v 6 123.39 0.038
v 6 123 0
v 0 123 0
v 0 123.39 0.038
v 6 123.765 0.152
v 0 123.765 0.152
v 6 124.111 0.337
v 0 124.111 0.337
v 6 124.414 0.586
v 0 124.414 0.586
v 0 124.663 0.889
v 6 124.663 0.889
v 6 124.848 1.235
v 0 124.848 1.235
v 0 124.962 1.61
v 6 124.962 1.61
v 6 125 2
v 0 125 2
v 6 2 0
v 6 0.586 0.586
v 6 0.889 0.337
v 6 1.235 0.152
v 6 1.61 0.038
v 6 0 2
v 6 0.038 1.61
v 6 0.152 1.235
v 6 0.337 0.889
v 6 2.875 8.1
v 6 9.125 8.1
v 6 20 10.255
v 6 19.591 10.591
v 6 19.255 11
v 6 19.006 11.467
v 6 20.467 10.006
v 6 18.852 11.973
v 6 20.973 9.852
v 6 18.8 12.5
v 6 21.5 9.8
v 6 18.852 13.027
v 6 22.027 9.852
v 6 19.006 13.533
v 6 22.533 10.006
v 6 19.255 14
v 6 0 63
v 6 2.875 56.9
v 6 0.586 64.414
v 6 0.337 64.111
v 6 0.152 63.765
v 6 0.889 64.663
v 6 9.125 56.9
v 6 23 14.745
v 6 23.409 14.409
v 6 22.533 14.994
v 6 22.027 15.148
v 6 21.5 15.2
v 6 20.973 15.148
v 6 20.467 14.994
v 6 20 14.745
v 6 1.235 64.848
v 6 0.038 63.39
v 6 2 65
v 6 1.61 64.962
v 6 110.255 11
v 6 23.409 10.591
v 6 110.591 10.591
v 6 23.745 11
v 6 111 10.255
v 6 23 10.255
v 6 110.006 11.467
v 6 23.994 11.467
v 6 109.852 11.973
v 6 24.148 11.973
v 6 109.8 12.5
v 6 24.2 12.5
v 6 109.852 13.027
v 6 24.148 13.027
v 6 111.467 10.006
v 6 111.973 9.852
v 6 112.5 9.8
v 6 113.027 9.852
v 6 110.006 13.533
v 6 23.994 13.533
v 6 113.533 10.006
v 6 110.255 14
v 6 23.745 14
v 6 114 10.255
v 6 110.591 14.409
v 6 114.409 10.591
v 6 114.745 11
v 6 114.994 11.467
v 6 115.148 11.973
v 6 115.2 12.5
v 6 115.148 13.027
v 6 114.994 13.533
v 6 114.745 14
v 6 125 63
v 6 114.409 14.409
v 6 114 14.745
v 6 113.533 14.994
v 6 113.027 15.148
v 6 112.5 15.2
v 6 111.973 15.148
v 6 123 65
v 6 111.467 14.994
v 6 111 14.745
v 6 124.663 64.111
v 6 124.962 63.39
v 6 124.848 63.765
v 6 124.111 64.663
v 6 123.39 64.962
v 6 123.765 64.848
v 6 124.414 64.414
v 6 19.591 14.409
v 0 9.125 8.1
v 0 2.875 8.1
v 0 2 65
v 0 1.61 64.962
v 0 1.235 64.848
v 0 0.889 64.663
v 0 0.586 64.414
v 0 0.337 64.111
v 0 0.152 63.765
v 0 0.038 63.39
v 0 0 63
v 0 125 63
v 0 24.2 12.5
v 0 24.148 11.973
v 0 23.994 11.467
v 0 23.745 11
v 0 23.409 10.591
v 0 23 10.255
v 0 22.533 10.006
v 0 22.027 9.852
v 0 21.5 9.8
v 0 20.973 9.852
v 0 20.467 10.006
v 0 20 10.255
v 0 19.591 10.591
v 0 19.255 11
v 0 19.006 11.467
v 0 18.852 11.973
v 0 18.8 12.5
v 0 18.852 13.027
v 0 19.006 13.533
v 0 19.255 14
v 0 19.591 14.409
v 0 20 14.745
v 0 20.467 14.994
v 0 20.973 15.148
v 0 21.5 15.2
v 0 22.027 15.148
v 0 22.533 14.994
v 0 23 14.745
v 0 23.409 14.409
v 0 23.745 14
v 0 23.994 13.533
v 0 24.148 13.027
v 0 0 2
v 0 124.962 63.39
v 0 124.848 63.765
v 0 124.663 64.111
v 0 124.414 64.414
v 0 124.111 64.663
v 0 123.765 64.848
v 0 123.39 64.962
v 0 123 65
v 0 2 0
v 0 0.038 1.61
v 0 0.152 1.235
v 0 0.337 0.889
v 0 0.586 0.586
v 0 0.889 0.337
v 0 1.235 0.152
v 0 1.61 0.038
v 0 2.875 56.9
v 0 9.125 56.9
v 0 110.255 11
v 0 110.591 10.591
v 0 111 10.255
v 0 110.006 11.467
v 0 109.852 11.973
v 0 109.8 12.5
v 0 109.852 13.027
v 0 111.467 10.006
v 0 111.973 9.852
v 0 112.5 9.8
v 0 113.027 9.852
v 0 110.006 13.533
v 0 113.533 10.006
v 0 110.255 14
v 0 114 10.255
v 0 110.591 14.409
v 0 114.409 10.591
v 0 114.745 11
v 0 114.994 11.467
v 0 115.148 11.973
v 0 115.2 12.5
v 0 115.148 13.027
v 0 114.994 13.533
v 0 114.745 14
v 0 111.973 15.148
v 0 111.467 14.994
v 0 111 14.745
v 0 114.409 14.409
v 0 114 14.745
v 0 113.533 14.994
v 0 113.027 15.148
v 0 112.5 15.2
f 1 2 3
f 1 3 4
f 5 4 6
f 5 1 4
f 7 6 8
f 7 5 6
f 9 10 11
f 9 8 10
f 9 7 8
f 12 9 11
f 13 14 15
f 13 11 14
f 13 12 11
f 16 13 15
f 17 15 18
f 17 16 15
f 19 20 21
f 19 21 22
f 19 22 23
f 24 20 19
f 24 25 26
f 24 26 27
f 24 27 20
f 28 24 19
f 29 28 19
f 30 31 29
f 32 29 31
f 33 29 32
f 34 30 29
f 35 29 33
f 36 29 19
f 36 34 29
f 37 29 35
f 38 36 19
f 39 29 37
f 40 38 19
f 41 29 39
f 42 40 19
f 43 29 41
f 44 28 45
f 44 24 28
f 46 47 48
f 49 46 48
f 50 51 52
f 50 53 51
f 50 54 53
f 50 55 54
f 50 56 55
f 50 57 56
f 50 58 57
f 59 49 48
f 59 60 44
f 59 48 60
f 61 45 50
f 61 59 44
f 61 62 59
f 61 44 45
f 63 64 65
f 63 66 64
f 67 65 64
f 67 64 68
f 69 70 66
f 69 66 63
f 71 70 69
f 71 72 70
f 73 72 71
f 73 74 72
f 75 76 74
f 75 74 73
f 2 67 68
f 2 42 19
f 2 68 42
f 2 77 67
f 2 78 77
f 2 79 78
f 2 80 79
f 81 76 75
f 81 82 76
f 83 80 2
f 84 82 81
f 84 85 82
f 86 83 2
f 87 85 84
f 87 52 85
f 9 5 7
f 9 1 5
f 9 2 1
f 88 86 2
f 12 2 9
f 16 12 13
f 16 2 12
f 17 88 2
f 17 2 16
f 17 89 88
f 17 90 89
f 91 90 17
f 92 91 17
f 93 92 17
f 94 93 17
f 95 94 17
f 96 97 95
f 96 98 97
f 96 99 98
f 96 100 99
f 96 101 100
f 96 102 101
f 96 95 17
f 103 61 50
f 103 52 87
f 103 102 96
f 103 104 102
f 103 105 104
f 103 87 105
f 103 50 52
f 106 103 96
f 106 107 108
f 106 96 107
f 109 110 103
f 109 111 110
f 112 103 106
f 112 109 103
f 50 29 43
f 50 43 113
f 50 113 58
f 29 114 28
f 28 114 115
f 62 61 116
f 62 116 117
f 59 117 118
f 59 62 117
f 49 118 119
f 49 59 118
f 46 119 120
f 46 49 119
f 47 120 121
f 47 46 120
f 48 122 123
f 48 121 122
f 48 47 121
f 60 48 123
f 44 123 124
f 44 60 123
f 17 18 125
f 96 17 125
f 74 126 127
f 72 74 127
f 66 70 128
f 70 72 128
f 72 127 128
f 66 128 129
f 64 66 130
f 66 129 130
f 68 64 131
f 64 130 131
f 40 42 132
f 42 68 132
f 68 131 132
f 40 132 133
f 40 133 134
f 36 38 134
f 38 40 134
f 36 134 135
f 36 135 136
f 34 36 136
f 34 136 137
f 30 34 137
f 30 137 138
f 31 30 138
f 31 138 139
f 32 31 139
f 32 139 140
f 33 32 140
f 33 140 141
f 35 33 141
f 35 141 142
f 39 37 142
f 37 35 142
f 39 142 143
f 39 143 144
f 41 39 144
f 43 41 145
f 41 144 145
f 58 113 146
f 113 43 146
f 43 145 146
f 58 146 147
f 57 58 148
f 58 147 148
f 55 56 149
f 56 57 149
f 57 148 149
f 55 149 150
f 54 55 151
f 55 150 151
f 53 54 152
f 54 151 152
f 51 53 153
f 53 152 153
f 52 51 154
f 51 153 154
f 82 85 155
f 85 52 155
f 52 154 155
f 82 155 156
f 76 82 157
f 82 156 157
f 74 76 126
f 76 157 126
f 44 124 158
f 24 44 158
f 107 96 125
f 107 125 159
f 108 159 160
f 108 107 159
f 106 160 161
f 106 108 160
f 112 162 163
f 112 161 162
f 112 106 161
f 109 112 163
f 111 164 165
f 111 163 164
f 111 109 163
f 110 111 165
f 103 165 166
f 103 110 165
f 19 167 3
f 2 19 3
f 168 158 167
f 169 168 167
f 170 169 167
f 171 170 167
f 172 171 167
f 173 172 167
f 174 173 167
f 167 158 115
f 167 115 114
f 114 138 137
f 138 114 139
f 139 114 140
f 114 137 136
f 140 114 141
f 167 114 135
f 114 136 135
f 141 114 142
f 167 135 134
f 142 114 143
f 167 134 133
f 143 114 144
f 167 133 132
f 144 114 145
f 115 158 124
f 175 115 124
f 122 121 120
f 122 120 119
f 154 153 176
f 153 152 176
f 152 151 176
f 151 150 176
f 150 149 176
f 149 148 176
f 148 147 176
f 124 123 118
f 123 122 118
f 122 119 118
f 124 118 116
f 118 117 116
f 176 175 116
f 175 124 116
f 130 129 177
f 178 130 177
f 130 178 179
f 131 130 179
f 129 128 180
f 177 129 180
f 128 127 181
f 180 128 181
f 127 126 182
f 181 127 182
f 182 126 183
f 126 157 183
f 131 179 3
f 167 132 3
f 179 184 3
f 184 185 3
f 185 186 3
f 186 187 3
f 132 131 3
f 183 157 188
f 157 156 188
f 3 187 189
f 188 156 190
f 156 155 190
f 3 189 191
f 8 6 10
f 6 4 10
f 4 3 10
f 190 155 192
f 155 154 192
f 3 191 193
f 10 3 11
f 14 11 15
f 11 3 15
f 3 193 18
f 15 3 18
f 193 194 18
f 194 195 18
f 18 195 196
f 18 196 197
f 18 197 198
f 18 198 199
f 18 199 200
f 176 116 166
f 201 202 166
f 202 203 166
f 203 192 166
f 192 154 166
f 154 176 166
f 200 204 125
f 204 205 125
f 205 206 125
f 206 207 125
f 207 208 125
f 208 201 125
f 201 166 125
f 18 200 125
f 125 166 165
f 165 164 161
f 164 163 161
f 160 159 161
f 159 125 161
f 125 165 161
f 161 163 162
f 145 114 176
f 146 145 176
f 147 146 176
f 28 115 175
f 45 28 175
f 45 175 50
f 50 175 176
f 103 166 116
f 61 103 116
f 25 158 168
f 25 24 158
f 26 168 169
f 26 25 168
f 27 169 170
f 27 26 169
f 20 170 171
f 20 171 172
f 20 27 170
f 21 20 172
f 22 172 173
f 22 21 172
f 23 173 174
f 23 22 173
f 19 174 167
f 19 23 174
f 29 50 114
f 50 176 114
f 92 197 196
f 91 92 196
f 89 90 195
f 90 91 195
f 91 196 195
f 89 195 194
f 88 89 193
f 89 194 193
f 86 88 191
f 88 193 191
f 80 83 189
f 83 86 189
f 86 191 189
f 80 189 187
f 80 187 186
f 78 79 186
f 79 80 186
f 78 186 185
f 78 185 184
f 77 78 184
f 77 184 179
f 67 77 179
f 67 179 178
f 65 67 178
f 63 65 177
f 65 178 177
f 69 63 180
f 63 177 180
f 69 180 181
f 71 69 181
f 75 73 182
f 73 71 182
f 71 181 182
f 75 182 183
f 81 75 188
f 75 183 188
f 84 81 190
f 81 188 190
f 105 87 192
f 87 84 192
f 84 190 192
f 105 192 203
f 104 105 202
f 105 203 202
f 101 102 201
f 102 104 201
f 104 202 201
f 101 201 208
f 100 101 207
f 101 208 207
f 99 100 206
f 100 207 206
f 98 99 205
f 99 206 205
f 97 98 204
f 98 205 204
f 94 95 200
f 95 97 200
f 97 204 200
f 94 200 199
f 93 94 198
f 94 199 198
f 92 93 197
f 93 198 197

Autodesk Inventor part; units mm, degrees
ref_plane "YZ Plane" through (0, 0, 0) normal (1, 0, 0) x (0, 1, 0)
ref_plane "XZ Plane" through (0, 0, 0) normal (0, 1, 0) x (-1, 0, 0)
ref_plane "XY Plane" through (0, 0, 0) normal (0, 0, 1) x (1, 0, 0)
sketch "Sketch1" plane through (0, 0, 0) normal (1, 0, 0) x (0, 1, 0)
  line L0 (0, 0) -> (125, 0)
  line L1 (125, 0) -> (125, 65)
  line L2 (125, 65) -> (0, 65)
  line L3 (0, 65) -> (0, 0)
  line L4 (2.875, 56.9) -> (9.125, 56.9)
  line L5 (9.125, 56.9) -> (9.125, 8.1)
  line L6 (9.125, 8.1) -> (2.875, 8.1)
  line L7 (2.875, 8.1) -> (2.875, 56.9)
  circle A0 centre (112.5, 12.5) radius 2.7
  circle A1 centre (21.5, 12.5) radius 2.7
  dimension "d0" = 65
  dimension "d1" = 125
  dimension "d2" = 6.25
  dimension "d3" = 2.875
  dimension "d4" = 8.1
  dimension "d5" = 8.1
  dimension "d6" = 12.5
  dimension "d7" = 21.5
  dimension "d8" = 12.5
  dimension "d9" = 5.4
extrude "Extrusion1" add sketch "Sketch1" along normal blind 6
fillet "Fillet1" radius 2 4 edges at (3, 125, 65) (3, 125, 0) (3, 0, 65) (3, 0, 0)
equation "\"d5\" = d4"
properties part number "FrontLeft"
